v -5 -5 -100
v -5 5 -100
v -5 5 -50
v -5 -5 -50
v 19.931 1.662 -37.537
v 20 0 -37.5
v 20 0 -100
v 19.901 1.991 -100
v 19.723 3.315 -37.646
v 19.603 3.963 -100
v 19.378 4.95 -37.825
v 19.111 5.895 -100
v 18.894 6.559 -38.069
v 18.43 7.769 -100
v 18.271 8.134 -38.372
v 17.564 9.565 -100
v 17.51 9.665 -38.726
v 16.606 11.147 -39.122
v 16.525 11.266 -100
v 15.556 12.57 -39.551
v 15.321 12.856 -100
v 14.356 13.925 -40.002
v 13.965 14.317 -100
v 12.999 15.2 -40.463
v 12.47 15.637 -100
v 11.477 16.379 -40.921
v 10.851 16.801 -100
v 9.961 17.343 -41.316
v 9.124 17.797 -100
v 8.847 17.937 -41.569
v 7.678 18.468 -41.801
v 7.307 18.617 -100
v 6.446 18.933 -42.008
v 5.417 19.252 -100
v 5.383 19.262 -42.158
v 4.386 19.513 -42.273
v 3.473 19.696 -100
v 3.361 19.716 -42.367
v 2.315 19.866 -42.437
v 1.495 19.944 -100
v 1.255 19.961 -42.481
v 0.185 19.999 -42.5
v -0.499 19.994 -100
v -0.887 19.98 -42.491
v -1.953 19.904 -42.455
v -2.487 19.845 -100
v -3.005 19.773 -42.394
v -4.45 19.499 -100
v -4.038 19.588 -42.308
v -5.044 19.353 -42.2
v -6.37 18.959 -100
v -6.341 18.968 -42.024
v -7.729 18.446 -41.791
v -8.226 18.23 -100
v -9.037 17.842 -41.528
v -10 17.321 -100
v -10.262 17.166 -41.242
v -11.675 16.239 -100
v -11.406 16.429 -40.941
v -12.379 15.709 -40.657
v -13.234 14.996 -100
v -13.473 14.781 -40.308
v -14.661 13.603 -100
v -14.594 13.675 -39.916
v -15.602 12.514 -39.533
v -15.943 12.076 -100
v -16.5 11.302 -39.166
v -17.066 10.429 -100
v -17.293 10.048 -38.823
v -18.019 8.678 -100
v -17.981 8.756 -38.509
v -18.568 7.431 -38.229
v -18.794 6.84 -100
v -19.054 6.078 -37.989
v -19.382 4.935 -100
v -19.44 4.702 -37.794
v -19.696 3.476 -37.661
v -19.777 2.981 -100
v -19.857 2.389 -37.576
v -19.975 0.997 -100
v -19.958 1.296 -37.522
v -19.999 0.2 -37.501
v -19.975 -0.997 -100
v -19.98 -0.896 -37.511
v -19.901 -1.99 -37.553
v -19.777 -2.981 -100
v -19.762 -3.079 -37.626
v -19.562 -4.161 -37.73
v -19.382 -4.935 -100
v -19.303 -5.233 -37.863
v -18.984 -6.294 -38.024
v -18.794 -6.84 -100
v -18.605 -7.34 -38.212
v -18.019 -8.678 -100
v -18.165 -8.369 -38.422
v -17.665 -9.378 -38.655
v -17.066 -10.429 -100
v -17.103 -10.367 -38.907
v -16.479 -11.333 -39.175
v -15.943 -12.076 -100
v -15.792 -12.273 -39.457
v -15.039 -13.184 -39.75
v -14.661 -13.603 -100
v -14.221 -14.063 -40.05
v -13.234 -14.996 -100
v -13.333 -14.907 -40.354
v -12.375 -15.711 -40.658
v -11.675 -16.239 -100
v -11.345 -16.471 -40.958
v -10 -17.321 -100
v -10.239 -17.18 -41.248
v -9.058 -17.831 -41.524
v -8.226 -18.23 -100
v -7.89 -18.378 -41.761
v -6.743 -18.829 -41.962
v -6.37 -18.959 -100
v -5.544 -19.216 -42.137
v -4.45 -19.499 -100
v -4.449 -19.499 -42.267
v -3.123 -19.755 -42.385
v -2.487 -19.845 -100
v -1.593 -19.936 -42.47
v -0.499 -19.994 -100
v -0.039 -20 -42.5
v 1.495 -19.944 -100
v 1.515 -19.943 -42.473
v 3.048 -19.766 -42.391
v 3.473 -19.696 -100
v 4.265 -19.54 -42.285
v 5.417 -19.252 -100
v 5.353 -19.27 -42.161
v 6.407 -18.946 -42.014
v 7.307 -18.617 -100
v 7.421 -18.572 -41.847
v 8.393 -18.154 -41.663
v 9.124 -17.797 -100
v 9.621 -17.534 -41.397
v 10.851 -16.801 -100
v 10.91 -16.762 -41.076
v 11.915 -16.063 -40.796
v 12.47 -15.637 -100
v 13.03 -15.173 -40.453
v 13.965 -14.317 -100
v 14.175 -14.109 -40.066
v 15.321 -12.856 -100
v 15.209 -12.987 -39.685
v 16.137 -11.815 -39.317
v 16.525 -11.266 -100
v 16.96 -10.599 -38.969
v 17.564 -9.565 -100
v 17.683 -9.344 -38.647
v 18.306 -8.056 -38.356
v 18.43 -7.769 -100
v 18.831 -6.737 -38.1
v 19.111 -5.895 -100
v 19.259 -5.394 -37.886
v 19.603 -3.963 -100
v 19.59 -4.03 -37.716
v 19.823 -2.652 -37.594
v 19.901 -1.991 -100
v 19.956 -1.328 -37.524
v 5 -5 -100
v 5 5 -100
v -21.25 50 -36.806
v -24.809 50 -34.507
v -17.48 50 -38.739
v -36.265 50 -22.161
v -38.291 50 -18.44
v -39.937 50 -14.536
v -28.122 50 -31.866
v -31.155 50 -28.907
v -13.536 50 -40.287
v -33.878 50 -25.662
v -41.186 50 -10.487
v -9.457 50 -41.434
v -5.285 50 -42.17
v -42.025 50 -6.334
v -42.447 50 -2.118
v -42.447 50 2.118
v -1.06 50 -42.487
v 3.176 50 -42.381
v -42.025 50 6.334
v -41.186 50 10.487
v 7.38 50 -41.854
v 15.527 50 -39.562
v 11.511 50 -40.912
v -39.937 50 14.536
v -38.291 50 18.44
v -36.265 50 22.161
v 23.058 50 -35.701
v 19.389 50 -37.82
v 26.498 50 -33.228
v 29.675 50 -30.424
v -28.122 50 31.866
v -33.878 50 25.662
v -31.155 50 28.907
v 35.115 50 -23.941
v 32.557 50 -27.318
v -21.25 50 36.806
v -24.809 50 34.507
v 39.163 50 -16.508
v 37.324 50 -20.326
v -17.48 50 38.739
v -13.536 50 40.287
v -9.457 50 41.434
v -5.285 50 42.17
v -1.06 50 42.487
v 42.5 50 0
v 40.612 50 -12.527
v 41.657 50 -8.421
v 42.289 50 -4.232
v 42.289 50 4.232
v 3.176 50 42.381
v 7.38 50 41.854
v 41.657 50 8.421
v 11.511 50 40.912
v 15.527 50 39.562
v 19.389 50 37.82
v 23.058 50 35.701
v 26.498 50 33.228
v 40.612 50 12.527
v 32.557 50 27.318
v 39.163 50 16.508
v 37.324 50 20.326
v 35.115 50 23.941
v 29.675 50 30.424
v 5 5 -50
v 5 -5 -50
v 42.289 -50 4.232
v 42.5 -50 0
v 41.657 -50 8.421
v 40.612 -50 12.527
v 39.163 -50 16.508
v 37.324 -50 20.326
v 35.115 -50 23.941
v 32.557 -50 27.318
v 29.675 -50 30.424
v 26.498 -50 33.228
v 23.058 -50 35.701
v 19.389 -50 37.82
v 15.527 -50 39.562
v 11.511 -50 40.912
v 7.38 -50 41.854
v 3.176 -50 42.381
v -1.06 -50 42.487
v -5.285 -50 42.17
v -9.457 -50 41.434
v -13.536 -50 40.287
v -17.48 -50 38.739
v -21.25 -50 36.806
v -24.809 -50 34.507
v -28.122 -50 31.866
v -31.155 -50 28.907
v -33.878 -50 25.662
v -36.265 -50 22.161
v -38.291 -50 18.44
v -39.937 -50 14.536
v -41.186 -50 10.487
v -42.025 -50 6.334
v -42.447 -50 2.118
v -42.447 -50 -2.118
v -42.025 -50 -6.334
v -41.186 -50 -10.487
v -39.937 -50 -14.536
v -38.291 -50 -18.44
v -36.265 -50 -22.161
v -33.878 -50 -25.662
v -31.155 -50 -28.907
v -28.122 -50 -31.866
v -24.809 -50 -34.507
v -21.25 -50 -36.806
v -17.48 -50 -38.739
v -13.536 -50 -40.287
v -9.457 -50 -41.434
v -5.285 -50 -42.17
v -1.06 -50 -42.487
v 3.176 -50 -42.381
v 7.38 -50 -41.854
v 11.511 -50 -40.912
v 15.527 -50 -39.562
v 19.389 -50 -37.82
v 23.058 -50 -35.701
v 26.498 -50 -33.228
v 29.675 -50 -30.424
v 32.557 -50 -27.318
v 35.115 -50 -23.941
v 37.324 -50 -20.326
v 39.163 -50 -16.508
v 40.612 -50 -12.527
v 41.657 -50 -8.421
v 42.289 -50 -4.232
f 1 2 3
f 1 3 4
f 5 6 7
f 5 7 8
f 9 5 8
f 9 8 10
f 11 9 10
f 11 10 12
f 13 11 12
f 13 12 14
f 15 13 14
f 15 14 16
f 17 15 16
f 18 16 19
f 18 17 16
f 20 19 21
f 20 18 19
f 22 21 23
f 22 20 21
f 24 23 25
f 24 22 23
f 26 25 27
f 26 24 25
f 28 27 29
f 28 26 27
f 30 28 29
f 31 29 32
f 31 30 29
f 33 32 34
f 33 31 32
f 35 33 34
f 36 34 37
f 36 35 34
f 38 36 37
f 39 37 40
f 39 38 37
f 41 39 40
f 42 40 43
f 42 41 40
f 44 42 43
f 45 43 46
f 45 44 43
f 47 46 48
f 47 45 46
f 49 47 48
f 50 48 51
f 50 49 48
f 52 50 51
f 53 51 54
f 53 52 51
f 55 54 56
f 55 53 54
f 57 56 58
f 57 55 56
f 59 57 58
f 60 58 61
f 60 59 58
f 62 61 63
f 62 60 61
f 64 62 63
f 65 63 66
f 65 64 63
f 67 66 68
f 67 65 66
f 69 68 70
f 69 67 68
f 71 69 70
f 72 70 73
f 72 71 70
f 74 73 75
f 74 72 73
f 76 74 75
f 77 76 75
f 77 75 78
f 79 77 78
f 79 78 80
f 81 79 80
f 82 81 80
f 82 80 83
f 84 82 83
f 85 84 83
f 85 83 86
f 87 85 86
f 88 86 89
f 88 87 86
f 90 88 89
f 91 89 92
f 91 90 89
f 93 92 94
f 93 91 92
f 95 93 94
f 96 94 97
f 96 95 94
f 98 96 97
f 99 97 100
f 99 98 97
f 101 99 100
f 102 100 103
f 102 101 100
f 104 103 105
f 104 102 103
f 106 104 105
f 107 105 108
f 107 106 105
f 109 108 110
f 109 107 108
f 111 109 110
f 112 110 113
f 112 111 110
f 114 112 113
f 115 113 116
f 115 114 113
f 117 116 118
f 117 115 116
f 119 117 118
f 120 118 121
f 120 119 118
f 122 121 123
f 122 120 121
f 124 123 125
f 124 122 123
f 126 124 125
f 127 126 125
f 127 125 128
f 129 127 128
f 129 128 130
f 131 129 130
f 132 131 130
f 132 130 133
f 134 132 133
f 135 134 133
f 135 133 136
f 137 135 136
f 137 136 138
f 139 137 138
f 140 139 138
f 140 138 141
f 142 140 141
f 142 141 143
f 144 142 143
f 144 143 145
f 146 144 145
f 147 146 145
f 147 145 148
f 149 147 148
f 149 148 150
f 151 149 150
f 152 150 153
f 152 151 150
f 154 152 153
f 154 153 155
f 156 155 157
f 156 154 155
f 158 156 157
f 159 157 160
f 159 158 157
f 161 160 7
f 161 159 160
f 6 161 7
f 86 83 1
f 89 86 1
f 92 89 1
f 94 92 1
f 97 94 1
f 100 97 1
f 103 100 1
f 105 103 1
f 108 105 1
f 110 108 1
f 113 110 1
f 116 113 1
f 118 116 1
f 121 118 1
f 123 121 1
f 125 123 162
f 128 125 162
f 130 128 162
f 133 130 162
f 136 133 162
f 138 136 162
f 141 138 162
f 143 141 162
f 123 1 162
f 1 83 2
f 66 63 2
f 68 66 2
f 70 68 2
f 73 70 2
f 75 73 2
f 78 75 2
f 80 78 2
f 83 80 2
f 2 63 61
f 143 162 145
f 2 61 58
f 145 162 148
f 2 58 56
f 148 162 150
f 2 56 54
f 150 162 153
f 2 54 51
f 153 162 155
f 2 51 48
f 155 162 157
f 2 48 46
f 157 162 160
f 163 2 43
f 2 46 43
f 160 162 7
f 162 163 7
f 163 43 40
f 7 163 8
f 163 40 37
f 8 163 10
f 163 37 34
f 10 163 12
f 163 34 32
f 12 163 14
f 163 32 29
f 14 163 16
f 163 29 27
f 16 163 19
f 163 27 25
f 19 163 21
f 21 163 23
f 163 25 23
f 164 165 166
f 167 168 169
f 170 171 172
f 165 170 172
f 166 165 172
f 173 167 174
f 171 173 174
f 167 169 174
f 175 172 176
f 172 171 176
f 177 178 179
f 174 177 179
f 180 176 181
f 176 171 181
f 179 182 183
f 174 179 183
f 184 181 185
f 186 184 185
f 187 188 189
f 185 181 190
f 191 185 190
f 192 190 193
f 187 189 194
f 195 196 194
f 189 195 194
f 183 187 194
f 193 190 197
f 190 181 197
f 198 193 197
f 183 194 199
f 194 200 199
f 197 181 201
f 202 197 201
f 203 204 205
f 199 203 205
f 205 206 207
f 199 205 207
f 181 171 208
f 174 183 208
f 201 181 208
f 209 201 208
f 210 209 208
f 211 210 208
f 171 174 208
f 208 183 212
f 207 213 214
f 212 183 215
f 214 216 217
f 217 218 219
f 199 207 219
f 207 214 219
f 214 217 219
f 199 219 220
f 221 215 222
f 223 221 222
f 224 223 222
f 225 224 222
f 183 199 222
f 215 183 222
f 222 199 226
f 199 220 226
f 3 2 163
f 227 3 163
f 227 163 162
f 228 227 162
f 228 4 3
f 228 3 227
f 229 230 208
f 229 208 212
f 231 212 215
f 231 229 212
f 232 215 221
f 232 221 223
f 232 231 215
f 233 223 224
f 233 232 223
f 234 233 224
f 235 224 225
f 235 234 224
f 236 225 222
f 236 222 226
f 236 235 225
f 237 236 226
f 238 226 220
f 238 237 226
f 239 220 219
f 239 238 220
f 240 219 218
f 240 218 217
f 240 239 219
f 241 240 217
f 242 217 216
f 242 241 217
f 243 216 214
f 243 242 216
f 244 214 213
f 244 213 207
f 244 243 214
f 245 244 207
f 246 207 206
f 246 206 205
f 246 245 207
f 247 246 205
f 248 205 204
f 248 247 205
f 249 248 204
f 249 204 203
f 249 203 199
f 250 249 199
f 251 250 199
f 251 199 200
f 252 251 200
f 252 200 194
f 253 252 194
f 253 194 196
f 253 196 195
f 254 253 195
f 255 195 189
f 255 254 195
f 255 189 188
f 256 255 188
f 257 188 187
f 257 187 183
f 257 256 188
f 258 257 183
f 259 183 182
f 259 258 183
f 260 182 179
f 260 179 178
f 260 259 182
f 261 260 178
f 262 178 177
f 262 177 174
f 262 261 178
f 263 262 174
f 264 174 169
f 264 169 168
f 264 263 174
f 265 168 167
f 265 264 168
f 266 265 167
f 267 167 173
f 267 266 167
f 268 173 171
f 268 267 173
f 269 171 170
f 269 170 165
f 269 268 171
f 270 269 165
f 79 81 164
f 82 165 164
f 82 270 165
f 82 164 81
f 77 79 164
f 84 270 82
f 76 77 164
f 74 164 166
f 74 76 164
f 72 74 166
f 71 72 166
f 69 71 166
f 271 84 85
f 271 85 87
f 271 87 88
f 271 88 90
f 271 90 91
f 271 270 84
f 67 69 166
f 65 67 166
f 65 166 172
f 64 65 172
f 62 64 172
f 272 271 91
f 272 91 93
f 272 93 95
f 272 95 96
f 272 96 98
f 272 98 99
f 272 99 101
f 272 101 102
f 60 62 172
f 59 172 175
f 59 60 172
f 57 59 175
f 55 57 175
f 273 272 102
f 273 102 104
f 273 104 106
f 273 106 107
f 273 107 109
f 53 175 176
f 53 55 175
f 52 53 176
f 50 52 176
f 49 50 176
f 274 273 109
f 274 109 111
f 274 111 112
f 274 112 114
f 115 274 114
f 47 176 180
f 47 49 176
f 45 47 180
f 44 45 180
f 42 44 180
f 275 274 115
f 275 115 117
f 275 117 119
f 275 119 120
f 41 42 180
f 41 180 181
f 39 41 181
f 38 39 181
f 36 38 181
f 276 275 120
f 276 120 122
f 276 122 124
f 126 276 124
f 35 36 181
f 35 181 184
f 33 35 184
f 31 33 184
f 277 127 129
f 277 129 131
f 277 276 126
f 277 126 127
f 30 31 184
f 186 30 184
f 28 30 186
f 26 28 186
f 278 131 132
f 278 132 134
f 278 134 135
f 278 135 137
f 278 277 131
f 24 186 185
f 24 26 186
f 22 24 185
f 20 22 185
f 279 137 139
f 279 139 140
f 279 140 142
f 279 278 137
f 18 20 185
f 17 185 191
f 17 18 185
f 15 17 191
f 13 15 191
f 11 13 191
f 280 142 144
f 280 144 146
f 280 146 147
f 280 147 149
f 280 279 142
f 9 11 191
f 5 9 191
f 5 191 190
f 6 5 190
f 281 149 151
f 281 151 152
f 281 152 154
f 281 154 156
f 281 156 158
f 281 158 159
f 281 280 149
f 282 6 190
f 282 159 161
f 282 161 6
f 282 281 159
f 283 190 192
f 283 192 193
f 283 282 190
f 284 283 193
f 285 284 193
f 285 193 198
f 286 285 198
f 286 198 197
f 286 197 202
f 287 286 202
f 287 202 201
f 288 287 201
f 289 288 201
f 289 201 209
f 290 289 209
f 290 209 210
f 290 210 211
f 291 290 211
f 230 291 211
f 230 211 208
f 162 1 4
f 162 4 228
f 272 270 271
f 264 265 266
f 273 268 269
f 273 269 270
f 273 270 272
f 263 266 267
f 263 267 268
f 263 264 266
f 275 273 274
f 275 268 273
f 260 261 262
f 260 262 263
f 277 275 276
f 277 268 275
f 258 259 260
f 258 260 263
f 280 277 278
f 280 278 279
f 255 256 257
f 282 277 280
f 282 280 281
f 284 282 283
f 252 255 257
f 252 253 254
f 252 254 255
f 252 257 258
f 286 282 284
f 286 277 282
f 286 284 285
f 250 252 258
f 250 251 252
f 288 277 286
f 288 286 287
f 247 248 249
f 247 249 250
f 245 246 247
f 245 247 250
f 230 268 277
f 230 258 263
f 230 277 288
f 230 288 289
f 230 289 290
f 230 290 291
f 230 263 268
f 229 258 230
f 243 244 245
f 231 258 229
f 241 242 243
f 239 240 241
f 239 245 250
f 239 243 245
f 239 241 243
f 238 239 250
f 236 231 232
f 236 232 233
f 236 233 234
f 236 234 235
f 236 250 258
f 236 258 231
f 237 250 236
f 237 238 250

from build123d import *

# Parameters (mm, degrees)
F0_R     = 42.5
F1_DEPTH = 50
F2_R     = 20
F3_DEPTH = 100
F4_W     = 10
F4_H     = 10
F5_DEPTH = 50


with BuildPart() as f1:
    # F0 (on Front) → F1 (new body, symmetric)
    with BuildSketch(Plane.XZ):
        Circle(F0_R)
    extrude(amount=F1_DEPTH, both=True)

    # F2 (on Top) → F3 (join)
    with BuildSketch(Plane.XY):
        Circle(F2_R)
    extrude(amount=-F3_DEPTH)

    # F4 (on face) → F5 (cut)
    with BuildSketch(Plane(origin=(0, 0, -100), x_dir=(1, 0, 0), z_dir=(0, 0, -1))):
        Rectangle(F4_W, F4_H)
    extrude(amount=-F5_DEPTH, mode=Mode.SUBTRACT)


solid = f1.part
